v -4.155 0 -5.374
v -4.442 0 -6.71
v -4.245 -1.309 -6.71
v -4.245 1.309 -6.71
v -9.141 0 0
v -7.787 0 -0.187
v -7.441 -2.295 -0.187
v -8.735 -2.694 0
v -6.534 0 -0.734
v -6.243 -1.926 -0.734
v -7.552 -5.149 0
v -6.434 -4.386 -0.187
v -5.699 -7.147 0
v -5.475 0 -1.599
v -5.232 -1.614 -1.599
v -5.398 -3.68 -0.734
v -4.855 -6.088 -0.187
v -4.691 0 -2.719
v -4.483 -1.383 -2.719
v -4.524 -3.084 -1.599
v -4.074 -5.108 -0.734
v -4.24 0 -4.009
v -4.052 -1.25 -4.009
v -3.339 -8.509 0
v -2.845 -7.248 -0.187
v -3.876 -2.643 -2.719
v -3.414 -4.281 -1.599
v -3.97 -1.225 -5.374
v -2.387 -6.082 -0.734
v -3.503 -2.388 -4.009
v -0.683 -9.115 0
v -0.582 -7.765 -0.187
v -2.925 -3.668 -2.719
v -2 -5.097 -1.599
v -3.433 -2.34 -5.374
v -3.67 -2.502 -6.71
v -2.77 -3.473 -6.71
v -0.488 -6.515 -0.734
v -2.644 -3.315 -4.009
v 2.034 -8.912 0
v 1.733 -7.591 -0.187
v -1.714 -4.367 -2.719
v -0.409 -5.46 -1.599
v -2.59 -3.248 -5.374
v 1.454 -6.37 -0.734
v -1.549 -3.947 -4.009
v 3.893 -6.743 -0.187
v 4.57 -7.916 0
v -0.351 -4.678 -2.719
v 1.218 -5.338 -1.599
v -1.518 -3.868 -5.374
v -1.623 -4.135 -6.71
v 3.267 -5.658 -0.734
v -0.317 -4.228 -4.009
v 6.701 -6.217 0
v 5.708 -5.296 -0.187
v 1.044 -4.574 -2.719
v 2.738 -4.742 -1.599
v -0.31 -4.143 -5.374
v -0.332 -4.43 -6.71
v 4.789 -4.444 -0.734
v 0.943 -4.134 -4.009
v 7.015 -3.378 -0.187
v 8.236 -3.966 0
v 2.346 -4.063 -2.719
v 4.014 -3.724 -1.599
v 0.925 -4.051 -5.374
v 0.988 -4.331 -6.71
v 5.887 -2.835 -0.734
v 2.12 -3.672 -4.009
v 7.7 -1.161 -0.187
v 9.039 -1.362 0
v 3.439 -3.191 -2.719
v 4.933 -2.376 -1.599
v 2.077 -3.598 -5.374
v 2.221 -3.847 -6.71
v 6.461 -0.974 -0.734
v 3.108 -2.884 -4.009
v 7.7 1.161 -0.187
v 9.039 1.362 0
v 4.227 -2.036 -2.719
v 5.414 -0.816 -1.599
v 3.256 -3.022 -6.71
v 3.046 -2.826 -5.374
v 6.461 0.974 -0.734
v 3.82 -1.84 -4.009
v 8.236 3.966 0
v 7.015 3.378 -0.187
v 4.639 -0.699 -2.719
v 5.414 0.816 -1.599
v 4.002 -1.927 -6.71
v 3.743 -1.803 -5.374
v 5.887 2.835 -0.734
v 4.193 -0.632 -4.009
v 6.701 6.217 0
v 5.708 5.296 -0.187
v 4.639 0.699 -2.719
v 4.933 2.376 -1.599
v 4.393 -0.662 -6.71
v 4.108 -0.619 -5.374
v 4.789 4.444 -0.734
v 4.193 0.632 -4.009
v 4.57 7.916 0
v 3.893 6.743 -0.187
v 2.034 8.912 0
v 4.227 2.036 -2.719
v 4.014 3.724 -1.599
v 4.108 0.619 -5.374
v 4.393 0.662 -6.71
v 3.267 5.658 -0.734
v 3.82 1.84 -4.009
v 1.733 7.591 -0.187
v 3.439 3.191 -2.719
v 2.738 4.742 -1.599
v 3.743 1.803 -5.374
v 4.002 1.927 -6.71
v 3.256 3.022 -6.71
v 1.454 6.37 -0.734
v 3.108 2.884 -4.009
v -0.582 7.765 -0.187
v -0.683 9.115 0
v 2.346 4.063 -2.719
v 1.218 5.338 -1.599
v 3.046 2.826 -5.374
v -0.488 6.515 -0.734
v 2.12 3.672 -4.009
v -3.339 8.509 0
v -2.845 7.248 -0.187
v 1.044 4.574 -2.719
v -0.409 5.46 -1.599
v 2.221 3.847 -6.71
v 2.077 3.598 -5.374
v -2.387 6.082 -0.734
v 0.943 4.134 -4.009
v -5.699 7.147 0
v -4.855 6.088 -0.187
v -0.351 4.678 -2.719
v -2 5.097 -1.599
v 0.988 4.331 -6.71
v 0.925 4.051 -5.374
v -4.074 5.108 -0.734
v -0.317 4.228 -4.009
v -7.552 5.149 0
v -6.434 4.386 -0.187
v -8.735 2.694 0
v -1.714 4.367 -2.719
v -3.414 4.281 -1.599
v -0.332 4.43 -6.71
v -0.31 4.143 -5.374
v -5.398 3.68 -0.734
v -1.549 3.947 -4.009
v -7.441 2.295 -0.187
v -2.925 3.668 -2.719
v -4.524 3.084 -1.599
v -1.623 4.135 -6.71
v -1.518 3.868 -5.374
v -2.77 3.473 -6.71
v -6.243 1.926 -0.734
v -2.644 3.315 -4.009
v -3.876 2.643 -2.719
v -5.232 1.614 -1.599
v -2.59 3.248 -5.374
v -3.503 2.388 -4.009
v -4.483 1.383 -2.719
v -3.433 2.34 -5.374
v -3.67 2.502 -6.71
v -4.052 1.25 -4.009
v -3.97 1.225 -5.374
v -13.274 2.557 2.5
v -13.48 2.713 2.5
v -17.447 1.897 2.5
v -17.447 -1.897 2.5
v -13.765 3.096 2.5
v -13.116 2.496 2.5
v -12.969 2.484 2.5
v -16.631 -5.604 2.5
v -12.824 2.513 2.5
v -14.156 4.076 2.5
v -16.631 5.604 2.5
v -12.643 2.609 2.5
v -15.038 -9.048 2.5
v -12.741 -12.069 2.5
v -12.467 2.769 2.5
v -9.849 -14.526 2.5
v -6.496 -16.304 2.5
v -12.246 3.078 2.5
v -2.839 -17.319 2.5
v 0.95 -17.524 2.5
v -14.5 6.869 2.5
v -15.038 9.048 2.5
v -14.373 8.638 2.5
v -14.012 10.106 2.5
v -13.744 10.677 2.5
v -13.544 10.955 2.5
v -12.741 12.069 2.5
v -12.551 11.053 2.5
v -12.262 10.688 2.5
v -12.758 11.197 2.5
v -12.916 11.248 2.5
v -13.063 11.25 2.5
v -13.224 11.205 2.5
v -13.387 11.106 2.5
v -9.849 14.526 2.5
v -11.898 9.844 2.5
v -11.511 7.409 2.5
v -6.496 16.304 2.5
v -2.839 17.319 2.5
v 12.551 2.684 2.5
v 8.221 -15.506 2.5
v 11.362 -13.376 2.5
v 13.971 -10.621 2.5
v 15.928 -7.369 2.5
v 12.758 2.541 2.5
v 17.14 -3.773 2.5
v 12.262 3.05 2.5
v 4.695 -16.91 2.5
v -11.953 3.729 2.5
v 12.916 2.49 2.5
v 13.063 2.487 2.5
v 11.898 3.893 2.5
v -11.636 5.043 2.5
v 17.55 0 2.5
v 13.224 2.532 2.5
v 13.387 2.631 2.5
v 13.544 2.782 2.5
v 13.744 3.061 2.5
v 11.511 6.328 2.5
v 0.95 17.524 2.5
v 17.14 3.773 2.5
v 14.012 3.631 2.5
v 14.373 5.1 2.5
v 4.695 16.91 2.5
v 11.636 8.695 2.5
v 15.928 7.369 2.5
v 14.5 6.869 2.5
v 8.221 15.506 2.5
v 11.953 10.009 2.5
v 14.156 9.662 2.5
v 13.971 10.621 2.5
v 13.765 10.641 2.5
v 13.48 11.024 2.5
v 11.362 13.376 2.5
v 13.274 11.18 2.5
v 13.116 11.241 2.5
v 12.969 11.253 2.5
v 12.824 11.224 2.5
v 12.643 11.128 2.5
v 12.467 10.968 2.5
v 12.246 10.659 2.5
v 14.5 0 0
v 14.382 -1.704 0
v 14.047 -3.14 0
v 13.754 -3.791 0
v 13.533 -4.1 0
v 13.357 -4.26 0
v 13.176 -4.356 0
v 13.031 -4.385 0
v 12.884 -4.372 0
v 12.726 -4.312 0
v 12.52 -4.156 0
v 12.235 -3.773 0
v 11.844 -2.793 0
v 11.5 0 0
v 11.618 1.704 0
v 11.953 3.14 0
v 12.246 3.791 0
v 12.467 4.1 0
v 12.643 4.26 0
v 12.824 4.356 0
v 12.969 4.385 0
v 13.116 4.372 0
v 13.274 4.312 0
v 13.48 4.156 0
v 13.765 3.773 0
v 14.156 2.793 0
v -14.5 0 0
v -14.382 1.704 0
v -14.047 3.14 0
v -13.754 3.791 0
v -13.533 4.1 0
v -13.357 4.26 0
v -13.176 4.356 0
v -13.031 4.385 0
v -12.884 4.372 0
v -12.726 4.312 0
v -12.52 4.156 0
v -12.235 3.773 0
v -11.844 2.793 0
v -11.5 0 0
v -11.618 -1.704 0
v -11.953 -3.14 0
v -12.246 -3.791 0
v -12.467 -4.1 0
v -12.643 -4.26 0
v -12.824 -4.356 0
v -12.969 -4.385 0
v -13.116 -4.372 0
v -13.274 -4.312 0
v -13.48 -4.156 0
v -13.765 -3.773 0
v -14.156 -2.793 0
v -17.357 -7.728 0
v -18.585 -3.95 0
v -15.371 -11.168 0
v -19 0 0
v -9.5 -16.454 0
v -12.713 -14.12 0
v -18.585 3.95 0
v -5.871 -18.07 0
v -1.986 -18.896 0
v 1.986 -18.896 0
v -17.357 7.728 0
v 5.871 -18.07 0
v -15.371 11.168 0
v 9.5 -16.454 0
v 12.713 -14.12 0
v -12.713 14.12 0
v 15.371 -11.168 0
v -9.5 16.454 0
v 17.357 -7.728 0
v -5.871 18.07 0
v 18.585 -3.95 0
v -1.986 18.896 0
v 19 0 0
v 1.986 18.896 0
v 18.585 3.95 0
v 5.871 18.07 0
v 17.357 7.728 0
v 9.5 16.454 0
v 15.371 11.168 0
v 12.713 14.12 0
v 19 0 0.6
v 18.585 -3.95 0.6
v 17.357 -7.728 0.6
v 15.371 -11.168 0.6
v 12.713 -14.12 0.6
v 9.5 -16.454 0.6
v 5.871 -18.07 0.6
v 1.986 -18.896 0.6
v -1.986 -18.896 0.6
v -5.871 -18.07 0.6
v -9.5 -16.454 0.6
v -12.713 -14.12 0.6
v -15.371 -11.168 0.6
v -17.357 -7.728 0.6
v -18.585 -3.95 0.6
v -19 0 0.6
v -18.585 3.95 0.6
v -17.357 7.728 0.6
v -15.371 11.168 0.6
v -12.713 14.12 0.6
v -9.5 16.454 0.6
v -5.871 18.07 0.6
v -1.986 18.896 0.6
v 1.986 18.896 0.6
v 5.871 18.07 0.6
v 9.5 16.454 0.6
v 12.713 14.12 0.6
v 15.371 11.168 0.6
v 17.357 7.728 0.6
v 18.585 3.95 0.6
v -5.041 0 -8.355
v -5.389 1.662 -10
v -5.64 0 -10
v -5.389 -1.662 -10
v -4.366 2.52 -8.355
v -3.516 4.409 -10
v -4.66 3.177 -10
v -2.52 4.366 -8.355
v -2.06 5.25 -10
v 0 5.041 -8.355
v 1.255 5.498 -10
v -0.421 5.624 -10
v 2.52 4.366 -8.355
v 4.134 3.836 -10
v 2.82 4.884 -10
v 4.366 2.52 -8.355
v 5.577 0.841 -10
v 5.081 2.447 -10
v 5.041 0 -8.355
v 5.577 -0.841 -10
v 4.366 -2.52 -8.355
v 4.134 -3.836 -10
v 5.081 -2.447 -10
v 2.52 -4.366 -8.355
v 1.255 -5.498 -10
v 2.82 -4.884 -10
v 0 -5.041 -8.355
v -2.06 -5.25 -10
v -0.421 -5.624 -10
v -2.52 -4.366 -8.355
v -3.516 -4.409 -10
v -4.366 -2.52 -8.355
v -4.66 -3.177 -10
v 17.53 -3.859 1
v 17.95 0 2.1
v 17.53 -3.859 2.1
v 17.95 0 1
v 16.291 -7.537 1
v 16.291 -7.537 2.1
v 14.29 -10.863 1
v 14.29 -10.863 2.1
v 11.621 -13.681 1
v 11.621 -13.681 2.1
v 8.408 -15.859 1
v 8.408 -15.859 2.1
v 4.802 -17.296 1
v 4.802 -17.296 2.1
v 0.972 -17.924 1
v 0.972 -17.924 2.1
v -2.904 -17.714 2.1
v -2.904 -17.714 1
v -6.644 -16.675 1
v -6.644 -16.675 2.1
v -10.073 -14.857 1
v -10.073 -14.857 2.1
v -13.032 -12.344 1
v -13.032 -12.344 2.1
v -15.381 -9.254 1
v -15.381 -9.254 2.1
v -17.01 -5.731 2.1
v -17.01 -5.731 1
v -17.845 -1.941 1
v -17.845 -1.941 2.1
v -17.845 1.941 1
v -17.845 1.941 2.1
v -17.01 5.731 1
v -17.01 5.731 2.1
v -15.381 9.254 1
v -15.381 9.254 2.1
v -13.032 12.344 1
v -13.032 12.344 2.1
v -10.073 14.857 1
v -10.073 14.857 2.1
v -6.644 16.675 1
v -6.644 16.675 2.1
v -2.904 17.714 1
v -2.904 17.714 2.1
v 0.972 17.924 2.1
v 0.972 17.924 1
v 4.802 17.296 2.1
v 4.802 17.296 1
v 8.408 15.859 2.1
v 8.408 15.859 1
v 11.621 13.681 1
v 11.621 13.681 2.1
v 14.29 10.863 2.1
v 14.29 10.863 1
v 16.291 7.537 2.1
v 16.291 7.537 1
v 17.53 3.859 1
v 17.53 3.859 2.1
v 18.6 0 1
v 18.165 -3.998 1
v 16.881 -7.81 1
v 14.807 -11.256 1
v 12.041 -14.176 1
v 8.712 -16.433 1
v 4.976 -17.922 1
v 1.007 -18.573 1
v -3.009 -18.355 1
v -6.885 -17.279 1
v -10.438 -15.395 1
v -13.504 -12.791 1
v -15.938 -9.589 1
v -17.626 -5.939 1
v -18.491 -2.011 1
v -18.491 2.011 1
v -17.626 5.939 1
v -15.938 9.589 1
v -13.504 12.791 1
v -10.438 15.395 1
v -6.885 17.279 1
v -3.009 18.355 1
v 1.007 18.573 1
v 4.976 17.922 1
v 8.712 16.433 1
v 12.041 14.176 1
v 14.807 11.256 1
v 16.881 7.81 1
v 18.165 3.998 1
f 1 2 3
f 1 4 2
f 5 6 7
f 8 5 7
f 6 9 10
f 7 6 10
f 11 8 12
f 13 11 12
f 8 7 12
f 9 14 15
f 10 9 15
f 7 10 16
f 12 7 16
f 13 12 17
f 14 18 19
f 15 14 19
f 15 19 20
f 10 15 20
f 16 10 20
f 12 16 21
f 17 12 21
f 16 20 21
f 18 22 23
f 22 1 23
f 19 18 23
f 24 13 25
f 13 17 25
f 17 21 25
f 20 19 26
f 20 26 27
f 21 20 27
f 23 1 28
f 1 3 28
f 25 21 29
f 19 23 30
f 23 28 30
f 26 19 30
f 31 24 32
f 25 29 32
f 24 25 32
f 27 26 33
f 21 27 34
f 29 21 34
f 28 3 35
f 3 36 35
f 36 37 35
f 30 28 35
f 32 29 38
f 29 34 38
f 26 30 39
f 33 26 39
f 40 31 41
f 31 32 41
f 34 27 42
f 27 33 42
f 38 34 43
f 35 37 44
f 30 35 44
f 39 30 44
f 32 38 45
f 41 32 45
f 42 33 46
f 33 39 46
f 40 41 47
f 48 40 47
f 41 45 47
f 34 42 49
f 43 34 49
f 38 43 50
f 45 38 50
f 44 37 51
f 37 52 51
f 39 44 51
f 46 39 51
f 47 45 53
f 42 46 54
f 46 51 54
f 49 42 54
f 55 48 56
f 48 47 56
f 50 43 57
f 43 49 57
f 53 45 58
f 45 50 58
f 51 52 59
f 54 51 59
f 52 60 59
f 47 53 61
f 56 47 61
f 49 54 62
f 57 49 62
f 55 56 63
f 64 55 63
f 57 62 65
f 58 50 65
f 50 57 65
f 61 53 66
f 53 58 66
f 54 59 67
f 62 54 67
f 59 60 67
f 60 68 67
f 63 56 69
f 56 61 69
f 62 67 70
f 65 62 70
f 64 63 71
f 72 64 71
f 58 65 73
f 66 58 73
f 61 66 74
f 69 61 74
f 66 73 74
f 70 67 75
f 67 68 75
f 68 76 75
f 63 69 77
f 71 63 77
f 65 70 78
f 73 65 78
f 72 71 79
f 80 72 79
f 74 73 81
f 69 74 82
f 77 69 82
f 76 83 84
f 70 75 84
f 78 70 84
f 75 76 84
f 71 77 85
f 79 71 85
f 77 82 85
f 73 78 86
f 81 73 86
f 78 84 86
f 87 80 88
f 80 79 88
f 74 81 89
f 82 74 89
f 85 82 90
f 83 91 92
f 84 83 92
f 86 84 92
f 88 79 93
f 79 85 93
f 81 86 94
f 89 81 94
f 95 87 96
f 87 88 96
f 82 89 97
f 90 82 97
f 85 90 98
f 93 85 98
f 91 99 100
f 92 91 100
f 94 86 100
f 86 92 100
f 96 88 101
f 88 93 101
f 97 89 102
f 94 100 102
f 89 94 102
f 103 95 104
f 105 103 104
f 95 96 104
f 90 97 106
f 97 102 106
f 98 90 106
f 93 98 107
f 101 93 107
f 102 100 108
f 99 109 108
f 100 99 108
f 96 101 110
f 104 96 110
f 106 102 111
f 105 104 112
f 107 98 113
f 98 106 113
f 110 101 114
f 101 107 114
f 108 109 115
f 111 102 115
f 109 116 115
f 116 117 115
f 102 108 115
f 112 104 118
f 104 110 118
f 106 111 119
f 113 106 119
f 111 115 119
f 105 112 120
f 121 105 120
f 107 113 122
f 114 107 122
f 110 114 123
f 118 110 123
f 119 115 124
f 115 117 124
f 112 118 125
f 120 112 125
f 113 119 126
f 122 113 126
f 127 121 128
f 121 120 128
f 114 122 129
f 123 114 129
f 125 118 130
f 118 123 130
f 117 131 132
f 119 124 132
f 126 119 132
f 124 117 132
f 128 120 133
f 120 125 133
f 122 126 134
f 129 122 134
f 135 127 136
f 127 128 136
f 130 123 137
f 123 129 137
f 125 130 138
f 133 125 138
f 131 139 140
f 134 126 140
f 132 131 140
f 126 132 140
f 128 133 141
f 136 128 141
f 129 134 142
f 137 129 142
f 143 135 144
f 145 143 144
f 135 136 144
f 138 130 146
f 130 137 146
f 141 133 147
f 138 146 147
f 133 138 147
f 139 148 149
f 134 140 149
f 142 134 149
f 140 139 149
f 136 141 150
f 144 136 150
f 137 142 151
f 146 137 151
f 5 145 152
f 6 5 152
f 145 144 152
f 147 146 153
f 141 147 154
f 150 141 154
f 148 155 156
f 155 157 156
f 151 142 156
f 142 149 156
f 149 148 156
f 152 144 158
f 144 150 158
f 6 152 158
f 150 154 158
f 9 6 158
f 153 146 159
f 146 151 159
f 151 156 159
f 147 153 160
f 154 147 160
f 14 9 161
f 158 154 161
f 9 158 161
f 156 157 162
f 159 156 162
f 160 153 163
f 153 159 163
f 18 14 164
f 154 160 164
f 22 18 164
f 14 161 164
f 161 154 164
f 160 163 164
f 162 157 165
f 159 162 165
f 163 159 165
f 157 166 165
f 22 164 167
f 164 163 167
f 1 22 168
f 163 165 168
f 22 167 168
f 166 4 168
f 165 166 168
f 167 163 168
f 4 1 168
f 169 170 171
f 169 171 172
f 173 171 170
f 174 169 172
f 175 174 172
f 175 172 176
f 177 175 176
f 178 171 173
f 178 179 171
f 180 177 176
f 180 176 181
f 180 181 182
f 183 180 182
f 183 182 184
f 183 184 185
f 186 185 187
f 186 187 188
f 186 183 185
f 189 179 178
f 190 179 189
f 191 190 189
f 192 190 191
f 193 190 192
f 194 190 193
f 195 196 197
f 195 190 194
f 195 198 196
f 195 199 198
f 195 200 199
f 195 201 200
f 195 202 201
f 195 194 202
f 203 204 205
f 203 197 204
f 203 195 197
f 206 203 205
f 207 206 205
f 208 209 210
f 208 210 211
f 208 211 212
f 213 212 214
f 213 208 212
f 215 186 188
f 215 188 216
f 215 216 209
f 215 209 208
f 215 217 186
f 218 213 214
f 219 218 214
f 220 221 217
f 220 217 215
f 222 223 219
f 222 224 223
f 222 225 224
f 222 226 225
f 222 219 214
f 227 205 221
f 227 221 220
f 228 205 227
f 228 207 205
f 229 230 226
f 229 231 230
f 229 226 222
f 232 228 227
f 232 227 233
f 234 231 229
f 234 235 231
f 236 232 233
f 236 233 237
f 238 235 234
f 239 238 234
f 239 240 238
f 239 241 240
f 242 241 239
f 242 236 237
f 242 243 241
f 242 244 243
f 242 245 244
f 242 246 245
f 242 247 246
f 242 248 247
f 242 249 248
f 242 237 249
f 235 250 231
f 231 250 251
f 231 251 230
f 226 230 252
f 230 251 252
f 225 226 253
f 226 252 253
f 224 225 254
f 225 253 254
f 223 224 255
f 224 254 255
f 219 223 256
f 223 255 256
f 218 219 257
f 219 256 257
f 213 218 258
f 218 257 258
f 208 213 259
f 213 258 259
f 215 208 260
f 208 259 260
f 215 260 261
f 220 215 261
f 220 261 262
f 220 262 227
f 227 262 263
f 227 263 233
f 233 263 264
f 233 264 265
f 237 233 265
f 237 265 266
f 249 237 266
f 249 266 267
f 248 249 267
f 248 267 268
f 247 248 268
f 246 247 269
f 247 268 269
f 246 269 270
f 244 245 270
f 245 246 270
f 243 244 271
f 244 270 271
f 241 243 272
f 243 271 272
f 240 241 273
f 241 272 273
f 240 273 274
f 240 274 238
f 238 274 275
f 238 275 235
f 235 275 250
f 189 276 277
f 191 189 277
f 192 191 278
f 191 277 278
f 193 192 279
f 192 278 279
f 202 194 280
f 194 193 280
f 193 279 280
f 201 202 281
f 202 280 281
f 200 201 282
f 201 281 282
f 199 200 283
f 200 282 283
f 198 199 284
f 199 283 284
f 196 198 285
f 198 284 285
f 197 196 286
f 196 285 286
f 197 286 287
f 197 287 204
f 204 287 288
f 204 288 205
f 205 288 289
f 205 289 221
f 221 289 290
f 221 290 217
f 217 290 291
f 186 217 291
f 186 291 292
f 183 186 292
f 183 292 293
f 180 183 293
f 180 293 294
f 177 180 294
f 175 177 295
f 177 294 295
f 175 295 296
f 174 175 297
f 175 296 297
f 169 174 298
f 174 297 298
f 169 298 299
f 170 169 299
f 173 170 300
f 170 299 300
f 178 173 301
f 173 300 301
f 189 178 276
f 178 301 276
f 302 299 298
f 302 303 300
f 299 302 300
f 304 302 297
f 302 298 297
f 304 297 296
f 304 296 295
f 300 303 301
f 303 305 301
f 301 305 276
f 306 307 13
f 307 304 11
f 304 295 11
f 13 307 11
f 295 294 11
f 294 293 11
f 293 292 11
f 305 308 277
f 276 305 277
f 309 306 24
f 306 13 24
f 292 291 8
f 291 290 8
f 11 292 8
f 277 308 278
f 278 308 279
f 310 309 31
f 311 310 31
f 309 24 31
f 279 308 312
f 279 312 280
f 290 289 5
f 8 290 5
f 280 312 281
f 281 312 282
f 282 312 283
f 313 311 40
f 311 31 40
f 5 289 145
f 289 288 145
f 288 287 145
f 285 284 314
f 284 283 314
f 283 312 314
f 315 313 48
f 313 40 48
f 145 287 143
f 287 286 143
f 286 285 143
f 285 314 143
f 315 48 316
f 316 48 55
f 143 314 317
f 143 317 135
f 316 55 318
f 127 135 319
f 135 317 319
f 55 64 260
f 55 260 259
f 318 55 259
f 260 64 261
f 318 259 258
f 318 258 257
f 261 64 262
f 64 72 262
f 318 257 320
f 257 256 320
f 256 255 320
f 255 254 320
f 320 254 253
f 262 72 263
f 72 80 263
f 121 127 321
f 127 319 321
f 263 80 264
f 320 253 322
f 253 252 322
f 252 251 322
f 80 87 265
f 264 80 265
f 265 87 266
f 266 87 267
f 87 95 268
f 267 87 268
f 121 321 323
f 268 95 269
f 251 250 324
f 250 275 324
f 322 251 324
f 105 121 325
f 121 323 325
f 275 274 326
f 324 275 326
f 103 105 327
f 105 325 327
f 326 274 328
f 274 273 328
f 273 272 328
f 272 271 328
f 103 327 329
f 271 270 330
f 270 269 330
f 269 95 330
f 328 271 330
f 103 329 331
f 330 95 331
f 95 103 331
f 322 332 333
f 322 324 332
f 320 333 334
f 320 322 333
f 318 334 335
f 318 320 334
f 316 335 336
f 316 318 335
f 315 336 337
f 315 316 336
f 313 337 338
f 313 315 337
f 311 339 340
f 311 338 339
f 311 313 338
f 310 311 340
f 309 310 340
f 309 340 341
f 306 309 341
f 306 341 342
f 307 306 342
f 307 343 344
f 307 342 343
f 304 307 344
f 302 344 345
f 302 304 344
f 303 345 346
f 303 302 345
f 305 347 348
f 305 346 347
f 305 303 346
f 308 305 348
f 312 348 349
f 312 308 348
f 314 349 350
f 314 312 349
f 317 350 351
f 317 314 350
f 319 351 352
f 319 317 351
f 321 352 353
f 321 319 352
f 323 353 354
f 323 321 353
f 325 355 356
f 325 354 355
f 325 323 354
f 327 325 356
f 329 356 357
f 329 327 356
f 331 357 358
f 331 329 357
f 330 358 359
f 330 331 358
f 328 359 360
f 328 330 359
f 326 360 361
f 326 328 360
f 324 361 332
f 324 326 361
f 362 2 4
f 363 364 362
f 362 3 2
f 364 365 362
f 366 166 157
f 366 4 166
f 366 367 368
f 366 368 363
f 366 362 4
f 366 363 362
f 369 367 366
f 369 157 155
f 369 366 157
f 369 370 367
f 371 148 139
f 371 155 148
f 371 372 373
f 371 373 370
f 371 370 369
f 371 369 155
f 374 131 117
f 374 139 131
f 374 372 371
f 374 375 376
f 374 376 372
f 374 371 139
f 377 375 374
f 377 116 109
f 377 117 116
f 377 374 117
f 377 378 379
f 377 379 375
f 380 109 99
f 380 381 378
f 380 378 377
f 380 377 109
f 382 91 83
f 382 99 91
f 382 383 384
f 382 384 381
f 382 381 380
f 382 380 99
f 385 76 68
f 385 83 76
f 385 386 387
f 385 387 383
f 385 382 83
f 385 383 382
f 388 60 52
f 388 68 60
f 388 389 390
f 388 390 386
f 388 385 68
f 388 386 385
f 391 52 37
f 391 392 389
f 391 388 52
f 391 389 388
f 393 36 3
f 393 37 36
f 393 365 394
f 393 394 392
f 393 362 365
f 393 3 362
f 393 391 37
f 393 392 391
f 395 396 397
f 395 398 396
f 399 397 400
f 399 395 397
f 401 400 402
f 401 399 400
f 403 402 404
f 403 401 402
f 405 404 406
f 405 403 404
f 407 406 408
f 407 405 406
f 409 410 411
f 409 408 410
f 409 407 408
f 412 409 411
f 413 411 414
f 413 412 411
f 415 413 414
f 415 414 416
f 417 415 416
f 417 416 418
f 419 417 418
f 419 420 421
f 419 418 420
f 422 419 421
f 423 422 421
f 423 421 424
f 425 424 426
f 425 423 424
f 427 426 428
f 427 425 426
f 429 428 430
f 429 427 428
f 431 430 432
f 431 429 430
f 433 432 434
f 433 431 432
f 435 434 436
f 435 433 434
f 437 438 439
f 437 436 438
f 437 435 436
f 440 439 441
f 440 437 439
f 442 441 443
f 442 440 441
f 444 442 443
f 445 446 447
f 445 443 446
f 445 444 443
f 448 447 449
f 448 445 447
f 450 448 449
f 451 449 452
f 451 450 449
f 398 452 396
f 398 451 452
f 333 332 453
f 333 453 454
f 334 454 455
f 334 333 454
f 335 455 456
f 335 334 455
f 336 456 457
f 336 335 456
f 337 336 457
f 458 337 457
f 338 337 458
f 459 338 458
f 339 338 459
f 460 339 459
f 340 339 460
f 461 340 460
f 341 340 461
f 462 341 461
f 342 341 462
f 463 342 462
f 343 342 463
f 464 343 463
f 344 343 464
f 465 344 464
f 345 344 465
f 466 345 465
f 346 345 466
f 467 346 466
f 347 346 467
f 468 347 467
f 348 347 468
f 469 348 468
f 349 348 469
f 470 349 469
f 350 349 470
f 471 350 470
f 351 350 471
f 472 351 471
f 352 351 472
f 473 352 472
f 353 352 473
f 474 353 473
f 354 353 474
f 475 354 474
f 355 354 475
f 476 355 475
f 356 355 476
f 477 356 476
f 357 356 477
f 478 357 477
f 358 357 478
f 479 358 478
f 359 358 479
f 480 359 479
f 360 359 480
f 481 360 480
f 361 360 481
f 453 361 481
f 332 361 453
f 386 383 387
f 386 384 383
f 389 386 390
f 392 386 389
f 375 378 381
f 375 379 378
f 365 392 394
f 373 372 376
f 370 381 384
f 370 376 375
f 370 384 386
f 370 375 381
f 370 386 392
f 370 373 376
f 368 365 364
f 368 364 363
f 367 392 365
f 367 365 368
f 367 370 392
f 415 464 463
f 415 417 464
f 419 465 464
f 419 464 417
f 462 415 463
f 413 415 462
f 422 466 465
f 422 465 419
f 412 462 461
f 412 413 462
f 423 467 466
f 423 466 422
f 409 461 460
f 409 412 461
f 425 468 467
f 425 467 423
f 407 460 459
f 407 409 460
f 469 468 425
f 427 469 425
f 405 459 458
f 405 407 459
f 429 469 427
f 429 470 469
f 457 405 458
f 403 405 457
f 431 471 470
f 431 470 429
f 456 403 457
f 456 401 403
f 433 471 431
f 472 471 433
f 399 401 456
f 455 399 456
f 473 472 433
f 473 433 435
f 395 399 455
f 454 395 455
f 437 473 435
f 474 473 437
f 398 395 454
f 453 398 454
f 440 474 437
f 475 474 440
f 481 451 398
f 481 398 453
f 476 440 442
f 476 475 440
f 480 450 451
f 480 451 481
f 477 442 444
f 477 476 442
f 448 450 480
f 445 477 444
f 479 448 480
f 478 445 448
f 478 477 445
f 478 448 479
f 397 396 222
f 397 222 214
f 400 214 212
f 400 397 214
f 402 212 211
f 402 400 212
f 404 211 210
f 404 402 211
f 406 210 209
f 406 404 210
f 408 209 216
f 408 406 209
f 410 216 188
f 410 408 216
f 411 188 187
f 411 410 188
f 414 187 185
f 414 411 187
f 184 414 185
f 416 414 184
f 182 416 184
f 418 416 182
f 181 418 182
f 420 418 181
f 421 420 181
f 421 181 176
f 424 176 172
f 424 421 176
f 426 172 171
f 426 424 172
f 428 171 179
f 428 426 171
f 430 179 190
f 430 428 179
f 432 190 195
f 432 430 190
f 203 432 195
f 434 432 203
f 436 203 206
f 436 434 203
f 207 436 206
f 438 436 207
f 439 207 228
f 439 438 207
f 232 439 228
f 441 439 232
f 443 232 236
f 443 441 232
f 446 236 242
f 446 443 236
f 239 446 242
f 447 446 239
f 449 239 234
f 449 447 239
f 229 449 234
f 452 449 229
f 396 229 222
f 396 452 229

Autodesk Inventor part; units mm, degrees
ref_plane "YZ Plane" through (0, 0, 0) normal (1, 0, 0) x (0, 1, 0)
ref_plane "XY Plane" through (0, 0, 0) normal (0, 0, 1) x (1, 0, 0)
sketch "Sketch1" plane through (0, 0, 0) normal (0, 0, 1) x (1, 0, 0)
  circle A0 centre (0, 0) radius 19
  dimension "d0" = 38
extrude "Extrusion1" add sketch "Sketch1" along normal blind 1
sketch "Sketch2" plane through (0, 0, 1) normal (0, 0, 1) x (1, 0, 0)
  circle A0 centre (0, 0) radius 17.95
  dimension "d3" = 35.9
extrude "Extrusion2" add sketch "Sketch2" along normal blind 1.5
chamfer "Chamfer1" distance 0.4 angle 45 1 edges at (-17.95, 0, 2.5)
chamfer "Chamfer2" distance 0.4 angle 45 1 edges at (-19, 0, 1)
sketch "Sketch3" plane through (0, 0, 0) normal (0, 0, -1) x (-1, 0, 0)
  circle A0 centre (0, 0) radius 2
  dimension "d12" = 4
extrude "Extrusion3" add sketch "Sketch3" along normal blind 10 draft 20
fillet "Fillet1" radius 5 1 edges at (2, 0, 0)
ref_plane "Work Plane1" through (0, 0, 0) normal (0, 0.9397, 0.342) x (1, 0, 0)
sketch "Sketch4" plane through (0, 0, 0) normal (0, 0.9397, 0.342) x (1, 0, 0)
  ellipse E0 centre (0, 0) end of major axis (19, 0) minor radius 6.4984 projected
  ellipse E1 centre (0, 0) end of major axis (9.1407, 0) minor radius 3.1263 projected
  line L0 (-26.6, 0) -> (26.6, 0) projected
  circle A0 centre (13, 0) radius 1.5
  ellipse E2 centre (0, 0) end of major axis (9.1407, 0) minor radius 3.1263 projected
  dimension "d17" = 3
  dimension "d18" = 13
extrude "Extrusion4" cut sketch "Sketch4" along normal through all both and the other way through all contours A0 L0 | L0 A0
mirror "Mirror1" about plane through (0, 0, 0) normal (1, 0, 0) of "Extrusion4"
equation "\"BendRadius\" = Thickness"
equation "\"BendReliefWidth\" = Thickness"
equation "\"BendReliefDepth\" = 0.5 * Thickness"
equation "\"CornerReliefSize\" = 4 * Thickness"
equation "\"MinimumRemnant\" = 2 * Thickness"
equation "\"TransitionRadius\" = BendRadius"
equation "\"JacobiRadiusSize\" = BendRadius"
equation "\"GapSize\" = Thickness"
equation "\"Thickness\" = 3.048"
properties part number "V4Lid"
